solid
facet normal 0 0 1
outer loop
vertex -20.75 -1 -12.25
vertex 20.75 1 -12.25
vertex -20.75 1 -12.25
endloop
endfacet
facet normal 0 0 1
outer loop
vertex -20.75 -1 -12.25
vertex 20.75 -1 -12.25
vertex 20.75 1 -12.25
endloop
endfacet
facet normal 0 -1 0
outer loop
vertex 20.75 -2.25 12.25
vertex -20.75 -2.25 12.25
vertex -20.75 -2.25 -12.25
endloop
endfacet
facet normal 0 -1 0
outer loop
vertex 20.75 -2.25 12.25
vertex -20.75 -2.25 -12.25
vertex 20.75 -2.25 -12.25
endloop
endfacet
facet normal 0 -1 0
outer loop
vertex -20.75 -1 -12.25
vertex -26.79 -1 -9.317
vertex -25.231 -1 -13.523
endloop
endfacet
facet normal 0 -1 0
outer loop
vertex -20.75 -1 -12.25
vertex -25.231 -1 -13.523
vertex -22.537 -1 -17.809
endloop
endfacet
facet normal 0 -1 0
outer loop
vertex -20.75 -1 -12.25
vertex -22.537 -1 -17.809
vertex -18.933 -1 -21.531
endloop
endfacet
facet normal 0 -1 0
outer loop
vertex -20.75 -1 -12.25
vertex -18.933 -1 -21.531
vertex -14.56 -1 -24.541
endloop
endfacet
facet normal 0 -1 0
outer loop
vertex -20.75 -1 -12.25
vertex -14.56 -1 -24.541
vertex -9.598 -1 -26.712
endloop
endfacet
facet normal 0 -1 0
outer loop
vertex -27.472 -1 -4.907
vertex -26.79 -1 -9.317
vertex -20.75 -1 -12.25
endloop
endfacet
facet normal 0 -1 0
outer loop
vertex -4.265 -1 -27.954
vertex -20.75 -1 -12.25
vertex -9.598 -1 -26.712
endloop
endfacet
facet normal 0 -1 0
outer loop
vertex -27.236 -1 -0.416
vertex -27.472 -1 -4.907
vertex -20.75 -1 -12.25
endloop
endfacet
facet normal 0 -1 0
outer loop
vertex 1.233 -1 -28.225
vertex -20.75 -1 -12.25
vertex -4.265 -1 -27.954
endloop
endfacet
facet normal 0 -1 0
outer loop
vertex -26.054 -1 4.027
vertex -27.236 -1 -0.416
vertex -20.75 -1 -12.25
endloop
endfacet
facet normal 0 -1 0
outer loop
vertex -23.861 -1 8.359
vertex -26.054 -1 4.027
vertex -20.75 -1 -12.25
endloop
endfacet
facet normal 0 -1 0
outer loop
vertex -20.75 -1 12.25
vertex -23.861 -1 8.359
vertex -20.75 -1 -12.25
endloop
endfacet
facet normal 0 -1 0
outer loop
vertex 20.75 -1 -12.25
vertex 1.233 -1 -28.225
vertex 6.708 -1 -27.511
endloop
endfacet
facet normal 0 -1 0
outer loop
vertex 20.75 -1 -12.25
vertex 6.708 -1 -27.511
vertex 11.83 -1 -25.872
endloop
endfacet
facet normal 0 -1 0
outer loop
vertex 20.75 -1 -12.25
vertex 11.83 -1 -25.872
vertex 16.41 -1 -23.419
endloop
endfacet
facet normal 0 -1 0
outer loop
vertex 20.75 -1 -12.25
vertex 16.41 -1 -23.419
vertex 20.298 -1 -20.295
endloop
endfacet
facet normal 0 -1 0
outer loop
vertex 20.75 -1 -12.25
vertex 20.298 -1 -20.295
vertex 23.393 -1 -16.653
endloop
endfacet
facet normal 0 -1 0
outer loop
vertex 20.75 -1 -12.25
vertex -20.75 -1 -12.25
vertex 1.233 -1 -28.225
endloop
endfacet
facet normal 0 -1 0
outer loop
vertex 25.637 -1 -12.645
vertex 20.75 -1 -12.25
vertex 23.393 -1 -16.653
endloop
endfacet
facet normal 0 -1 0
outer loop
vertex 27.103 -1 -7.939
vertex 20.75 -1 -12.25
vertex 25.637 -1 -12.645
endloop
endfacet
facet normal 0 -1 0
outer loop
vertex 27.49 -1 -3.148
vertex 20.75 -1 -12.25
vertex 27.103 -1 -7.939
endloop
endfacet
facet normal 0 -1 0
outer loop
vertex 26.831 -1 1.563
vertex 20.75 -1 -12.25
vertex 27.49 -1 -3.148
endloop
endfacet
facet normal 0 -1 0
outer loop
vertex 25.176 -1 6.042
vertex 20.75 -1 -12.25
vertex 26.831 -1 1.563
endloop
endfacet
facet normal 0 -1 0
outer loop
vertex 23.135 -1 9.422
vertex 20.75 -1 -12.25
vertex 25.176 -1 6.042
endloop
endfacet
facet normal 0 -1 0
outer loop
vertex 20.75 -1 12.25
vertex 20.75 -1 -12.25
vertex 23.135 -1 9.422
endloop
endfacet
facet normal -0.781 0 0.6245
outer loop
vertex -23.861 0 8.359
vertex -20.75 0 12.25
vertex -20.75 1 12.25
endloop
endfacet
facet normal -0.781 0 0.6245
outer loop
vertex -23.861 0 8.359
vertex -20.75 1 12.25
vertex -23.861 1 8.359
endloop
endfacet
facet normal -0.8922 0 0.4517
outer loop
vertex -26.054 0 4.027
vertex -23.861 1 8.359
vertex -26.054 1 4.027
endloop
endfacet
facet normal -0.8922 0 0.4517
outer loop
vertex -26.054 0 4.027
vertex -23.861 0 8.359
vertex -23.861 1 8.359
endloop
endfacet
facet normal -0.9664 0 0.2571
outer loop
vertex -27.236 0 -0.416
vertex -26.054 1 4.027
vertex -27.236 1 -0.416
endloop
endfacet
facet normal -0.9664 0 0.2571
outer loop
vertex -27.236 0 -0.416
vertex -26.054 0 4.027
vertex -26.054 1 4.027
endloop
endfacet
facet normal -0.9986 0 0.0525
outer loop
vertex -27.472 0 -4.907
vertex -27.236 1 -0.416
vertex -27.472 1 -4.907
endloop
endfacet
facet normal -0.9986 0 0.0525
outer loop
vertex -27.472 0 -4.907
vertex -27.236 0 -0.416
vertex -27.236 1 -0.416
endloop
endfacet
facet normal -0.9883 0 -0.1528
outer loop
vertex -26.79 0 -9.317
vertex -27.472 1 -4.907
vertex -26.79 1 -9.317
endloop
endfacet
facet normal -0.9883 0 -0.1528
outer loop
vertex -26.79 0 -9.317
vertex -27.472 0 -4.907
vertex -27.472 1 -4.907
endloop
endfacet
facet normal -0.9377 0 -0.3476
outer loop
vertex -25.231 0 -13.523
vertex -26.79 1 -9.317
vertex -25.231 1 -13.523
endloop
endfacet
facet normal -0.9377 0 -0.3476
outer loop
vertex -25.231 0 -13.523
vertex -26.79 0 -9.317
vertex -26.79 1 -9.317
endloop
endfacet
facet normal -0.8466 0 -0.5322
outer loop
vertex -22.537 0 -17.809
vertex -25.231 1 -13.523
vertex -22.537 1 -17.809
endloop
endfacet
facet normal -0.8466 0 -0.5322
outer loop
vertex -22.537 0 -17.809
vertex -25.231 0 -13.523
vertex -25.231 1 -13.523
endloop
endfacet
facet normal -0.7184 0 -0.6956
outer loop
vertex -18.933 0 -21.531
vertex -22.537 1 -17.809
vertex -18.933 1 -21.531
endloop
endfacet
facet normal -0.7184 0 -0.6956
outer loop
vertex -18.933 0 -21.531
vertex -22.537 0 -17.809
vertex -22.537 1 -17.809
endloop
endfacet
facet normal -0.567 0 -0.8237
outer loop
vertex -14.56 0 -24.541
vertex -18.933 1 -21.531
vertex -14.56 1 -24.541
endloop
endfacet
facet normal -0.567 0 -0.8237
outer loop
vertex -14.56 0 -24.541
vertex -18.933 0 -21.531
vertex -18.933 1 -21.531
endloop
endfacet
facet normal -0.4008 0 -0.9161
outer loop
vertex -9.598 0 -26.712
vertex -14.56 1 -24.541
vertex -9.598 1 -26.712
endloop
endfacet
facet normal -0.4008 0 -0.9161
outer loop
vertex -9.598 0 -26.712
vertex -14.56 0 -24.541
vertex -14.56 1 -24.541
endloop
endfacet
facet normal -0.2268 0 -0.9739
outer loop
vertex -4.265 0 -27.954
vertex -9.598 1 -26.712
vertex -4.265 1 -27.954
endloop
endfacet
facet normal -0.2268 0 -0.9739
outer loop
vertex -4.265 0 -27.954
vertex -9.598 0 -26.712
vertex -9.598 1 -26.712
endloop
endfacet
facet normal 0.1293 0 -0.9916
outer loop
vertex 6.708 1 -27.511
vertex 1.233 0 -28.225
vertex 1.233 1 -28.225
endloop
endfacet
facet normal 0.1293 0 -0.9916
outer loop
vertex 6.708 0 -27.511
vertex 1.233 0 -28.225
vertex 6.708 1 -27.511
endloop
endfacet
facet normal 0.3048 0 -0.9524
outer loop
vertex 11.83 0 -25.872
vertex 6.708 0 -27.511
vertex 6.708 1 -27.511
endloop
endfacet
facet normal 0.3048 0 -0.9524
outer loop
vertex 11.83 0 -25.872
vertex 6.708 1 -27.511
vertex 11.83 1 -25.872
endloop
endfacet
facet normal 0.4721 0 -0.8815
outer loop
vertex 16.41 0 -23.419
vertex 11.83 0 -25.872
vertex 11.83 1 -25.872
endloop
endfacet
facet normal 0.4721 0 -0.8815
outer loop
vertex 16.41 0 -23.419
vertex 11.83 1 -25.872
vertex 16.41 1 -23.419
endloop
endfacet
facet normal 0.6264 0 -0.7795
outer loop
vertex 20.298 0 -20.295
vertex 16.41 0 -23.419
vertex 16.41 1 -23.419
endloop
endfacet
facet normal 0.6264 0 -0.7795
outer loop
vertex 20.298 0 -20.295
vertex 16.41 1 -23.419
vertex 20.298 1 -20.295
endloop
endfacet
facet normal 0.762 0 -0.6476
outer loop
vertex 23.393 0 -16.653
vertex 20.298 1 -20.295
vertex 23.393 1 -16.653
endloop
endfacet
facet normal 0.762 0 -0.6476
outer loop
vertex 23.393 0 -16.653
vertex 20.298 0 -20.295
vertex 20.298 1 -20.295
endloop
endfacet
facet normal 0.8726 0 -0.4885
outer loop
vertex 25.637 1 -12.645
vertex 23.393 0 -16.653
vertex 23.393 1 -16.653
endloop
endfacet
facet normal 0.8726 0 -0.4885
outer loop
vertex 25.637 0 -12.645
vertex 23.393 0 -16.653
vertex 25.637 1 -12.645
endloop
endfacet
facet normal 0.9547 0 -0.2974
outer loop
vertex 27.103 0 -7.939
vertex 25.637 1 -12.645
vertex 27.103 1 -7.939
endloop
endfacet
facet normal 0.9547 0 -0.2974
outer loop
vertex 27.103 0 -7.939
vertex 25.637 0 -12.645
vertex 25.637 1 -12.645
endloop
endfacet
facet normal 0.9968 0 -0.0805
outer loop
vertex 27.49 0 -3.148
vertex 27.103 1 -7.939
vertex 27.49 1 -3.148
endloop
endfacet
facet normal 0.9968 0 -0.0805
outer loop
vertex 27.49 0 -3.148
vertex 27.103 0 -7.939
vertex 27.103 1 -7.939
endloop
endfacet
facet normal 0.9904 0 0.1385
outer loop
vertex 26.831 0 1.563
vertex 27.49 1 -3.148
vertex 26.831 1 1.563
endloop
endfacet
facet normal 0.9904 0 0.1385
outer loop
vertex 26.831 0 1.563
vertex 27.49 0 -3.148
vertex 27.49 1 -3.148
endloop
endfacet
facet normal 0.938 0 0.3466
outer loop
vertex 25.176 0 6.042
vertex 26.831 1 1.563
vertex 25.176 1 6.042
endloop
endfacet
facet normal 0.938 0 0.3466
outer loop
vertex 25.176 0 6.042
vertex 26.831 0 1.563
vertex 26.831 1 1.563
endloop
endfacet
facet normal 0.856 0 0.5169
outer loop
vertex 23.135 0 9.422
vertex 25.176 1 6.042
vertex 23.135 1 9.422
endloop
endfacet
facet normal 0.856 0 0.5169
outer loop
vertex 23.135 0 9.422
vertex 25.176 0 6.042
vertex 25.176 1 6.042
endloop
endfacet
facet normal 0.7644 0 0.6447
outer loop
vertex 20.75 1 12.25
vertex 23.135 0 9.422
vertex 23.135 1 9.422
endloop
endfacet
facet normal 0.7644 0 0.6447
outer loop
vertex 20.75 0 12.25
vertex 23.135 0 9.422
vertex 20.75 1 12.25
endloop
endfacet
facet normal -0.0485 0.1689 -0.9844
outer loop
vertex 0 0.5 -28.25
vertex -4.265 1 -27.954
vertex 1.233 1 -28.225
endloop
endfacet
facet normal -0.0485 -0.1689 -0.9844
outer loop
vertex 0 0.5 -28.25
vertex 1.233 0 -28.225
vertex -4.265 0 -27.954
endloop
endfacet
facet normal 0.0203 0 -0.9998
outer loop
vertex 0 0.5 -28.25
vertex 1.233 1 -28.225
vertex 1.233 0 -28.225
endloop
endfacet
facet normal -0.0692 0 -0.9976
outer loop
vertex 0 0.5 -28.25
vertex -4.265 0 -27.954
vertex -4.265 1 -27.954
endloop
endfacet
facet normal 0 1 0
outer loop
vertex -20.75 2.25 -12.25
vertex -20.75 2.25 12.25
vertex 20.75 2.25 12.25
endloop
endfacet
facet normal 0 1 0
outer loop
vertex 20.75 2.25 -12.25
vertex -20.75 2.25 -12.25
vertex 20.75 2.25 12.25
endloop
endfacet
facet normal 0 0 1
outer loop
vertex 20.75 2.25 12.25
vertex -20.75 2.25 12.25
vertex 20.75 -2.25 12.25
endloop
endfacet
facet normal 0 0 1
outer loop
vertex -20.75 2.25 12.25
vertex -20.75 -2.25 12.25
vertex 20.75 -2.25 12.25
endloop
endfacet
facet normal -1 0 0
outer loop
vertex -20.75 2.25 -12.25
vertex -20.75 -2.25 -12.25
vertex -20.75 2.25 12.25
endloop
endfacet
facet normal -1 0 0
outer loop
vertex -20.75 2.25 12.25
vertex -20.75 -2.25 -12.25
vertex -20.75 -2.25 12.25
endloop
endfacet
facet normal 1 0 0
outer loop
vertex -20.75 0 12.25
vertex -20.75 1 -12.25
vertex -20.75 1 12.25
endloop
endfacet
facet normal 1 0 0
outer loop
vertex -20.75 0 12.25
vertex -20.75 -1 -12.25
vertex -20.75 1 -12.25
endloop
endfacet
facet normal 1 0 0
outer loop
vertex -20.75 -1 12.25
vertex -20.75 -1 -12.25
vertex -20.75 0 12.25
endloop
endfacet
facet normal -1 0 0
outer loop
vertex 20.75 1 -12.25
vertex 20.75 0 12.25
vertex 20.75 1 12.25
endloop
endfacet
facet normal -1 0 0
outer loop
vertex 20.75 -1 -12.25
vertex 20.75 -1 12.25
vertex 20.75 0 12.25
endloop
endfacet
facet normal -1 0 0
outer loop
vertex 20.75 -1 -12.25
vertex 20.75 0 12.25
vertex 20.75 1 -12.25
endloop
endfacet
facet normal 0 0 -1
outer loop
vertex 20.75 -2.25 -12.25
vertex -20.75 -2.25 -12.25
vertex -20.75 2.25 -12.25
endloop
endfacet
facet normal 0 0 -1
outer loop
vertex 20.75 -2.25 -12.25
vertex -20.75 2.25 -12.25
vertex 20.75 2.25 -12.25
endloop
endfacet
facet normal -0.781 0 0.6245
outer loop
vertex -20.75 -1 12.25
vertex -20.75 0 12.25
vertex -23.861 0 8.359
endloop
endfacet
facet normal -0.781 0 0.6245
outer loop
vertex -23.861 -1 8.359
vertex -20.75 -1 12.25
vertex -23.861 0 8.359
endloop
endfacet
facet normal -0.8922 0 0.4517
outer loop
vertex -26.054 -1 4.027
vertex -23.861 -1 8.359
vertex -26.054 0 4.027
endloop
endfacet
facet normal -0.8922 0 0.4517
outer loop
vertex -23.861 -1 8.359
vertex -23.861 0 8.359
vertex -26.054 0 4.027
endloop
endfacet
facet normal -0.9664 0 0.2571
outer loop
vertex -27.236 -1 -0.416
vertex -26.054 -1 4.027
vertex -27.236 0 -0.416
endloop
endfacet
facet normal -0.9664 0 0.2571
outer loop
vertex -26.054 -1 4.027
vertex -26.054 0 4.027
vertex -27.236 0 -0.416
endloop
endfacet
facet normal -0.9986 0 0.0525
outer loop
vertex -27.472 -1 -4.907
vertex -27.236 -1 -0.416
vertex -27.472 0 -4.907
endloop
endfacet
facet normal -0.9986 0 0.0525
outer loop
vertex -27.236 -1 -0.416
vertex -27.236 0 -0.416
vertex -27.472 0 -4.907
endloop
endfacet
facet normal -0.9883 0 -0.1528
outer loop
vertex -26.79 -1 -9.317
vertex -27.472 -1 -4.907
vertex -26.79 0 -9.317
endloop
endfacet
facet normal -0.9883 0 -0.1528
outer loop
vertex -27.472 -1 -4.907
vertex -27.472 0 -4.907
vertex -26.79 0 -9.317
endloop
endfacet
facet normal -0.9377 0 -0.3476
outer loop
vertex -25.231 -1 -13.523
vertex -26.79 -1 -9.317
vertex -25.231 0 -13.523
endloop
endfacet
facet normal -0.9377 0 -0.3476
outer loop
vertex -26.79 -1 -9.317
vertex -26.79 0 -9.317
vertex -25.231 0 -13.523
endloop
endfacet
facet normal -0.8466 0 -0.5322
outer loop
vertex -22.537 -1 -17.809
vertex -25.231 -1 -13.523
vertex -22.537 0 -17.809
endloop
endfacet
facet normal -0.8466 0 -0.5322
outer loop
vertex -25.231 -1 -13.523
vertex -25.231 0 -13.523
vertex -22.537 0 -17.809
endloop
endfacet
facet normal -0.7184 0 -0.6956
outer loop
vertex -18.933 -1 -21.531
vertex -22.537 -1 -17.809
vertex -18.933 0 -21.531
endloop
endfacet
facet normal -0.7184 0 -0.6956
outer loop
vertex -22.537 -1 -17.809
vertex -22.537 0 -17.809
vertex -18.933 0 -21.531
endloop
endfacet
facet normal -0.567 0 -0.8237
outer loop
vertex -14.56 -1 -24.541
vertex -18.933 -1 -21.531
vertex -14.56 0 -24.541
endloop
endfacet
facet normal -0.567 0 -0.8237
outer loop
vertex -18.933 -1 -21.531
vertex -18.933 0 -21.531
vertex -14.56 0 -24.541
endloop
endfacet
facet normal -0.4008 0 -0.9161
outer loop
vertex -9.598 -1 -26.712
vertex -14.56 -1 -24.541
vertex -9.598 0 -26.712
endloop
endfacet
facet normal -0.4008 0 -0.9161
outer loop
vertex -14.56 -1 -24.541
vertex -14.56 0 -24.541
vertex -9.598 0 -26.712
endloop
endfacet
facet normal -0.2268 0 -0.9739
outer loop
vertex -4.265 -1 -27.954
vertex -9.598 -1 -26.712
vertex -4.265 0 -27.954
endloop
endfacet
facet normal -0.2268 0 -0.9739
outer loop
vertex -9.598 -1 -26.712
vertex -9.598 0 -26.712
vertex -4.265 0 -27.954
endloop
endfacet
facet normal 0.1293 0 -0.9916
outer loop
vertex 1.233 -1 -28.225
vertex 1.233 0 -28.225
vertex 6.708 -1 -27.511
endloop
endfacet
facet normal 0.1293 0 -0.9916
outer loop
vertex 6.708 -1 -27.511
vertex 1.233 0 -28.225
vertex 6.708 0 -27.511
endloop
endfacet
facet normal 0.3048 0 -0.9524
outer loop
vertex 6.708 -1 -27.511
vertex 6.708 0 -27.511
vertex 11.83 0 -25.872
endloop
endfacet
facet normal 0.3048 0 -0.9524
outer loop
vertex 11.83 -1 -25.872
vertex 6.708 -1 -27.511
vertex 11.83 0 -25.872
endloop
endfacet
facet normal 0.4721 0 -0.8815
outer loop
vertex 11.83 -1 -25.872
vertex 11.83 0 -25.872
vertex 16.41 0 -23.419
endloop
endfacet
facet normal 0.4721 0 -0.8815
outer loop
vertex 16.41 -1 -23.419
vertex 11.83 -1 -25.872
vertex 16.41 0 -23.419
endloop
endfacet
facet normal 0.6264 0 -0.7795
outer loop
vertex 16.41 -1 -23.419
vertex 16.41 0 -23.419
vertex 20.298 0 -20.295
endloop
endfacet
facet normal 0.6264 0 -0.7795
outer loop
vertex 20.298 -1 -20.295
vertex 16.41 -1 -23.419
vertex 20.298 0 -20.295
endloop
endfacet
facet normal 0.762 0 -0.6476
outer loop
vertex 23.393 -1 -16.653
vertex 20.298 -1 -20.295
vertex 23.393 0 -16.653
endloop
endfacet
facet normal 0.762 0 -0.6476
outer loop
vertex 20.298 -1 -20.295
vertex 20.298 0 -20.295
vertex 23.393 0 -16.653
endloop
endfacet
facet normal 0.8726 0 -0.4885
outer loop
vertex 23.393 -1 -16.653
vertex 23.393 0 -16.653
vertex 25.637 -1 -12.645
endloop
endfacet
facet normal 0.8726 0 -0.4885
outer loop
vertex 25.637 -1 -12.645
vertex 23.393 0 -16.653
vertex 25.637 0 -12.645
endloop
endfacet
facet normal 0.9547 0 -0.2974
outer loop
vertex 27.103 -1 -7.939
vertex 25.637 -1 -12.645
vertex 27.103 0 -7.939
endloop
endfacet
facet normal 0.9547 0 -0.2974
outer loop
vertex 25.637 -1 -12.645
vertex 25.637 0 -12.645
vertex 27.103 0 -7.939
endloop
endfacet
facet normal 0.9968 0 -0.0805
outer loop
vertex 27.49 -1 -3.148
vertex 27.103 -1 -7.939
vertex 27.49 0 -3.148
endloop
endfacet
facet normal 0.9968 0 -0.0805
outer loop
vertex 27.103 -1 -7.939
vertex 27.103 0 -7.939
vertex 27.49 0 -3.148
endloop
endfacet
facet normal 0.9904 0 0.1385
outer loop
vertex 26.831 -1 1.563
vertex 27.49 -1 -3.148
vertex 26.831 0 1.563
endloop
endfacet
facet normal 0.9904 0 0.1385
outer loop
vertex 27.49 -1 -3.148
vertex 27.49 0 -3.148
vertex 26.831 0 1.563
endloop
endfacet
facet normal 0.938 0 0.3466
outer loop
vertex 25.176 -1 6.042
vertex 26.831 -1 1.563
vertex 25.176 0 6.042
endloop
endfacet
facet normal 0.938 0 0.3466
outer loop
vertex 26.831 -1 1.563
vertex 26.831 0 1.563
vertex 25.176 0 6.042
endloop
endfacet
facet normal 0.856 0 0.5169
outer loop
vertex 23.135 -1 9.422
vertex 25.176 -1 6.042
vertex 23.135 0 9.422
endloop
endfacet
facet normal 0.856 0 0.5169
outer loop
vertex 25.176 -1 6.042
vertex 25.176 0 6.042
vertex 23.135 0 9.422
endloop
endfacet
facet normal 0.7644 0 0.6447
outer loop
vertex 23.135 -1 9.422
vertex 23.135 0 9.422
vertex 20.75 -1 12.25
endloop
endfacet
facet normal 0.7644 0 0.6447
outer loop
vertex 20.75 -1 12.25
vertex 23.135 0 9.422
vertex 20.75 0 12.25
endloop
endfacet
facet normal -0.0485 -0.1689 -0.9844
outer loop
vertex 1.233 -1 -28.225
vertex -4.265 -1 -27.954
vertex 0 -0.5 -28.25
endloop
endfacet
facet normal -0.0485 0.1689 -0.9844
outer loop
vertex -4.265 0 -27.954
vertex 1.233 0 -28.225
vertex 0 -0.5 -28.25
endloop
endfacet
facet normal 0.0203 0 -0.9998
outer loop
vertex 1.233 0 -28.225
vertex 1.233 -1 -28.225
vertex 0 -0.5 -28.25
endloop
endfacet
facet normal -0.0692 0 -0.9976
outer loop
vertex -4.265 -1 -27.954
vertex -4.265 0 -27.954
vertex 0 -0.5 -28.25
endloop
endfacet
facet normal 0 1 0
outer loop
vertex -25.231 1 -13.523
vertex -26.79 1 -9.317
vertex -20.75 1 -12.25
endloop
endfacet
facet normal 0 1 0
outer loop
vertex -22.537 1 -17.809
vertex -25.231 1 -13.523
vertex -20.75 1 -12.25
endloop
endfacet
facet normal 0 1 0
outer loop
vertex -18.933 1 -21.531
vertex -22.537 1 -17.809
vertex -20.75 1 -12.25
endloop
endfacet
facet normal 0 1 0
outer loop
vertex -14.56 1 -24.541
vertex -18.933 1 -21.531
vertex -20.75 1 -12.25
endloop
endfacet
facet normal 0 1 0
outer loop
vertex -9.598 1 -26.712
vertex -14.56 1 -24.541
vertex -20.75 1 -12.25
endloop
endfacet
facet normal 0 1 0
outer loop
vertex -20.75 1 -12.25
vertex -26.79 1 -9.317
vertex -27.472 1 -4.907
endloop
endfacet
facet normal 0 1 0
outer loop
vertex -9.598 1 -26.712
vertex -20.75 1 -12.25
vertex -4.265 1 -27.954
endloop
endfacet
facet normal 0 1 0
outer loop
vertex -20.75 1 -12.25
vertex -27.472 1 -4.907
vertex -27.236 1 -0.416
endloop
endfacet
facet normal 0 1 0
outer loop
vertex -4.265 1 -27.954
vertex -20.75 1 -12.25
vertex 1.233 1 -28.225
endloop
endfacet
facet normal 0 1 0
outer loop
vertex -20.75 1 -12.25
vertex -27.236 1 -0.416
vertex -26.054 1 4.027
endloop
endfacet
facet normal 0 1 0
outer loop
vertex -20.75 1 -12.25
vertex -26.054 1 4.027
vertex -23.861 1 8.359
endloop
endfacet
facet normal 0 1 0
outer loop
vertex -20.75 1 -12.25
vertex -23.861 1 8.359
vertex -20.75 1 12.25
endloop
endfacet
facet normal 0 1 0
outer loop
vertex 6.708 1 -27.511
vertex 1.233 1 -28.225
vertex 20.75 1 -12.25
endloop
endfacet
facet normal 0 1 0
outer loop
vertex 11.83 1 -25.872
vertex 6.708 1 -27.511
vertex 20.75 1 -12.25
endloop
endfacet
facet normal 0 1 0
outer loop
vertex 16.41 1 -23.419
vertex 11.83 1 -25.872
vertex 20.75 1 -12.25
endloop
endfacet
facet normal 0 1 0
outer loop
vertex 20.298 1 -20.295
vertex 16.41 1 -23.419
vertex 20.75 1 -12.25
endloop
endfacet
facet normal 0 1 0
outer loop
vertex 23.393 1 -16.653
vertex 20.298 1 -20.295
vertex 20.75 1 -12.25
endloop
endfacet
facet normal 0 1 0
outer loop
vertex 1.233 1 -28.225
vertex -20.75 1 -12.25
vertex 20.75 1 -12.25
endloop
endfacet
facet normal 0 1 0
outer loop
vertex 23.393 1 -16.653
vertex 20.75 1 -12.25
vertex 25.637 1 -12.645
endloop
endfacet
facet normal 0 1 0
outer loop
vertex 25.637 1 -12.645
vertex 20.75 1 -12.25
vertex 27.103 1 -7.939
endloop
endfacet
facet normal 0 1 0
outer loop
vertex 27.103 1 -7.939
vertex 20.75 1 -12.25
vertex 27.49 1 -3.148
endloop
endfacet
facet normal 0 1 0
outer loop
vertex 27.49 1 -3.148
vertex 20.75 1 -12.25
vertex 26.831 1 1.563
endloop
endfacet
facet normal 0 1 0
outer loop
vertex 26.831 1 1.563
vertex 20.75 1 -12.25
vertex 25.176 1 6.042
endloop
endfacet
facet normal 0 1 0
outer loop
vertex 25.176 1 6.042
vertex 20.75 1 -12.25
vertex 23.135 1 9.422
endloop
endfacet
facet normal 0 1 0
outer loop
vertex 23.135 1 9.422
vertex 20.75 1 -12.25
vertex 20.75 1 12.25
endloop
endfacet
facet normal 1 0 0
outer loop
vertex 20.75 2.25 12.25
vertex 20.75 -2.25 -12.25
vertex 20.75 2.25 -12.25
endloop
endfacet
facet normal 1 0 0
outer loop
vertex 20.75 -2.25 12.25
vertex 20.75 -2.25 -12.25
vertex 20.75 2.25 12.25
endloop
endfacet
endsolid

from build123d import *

# Parameters (mm, degrees)
F1_W     = 41.5
F1_H     = 24.5
F2_DEPTH = 2.25
F3_DEPTH = 1


with BuildPart() as f2:
    # F1 (on Front) → F2 (new body, symmetric)
    with BuildSketch(Plane.XZ):
        Rectangle(F1_W, F1_H)
    extrude(amount=F2_DEPTH, both=True)


with BuildPart() as f3:
    # F1 (on Front) → F3 (new body, symmetric)
    with BuildSketch(Plane.XZ):
        with BuildLine():
            Line((-20.75, -12.25), (-20.75, 12.25))
            add(Edge.make_bspline(
                [(-20.75, 12.25), (-60.3632476333, -28.25), (0, -28.25), (60.3632476333, -28.25), (20.75, 12.25)],
                knots=[2.4257575272, 2.4257575272, 2.4257575272, 4.7123889804, 4.7123889804, 6.9990204336, 6.9990204336, 6.9990204336], degree=2, weights=[1, 0.4145794337, 1, 0.4145794337, 1]))
            Line((20.75, 12.25), (20.75, -12.25))
            Line((20.75, -12.25), (-20.75, -12.25))
        make_face()
    extrude(amount=F3_DEPTH, both=True)


solid = Compound([f2.part, f3.part])
